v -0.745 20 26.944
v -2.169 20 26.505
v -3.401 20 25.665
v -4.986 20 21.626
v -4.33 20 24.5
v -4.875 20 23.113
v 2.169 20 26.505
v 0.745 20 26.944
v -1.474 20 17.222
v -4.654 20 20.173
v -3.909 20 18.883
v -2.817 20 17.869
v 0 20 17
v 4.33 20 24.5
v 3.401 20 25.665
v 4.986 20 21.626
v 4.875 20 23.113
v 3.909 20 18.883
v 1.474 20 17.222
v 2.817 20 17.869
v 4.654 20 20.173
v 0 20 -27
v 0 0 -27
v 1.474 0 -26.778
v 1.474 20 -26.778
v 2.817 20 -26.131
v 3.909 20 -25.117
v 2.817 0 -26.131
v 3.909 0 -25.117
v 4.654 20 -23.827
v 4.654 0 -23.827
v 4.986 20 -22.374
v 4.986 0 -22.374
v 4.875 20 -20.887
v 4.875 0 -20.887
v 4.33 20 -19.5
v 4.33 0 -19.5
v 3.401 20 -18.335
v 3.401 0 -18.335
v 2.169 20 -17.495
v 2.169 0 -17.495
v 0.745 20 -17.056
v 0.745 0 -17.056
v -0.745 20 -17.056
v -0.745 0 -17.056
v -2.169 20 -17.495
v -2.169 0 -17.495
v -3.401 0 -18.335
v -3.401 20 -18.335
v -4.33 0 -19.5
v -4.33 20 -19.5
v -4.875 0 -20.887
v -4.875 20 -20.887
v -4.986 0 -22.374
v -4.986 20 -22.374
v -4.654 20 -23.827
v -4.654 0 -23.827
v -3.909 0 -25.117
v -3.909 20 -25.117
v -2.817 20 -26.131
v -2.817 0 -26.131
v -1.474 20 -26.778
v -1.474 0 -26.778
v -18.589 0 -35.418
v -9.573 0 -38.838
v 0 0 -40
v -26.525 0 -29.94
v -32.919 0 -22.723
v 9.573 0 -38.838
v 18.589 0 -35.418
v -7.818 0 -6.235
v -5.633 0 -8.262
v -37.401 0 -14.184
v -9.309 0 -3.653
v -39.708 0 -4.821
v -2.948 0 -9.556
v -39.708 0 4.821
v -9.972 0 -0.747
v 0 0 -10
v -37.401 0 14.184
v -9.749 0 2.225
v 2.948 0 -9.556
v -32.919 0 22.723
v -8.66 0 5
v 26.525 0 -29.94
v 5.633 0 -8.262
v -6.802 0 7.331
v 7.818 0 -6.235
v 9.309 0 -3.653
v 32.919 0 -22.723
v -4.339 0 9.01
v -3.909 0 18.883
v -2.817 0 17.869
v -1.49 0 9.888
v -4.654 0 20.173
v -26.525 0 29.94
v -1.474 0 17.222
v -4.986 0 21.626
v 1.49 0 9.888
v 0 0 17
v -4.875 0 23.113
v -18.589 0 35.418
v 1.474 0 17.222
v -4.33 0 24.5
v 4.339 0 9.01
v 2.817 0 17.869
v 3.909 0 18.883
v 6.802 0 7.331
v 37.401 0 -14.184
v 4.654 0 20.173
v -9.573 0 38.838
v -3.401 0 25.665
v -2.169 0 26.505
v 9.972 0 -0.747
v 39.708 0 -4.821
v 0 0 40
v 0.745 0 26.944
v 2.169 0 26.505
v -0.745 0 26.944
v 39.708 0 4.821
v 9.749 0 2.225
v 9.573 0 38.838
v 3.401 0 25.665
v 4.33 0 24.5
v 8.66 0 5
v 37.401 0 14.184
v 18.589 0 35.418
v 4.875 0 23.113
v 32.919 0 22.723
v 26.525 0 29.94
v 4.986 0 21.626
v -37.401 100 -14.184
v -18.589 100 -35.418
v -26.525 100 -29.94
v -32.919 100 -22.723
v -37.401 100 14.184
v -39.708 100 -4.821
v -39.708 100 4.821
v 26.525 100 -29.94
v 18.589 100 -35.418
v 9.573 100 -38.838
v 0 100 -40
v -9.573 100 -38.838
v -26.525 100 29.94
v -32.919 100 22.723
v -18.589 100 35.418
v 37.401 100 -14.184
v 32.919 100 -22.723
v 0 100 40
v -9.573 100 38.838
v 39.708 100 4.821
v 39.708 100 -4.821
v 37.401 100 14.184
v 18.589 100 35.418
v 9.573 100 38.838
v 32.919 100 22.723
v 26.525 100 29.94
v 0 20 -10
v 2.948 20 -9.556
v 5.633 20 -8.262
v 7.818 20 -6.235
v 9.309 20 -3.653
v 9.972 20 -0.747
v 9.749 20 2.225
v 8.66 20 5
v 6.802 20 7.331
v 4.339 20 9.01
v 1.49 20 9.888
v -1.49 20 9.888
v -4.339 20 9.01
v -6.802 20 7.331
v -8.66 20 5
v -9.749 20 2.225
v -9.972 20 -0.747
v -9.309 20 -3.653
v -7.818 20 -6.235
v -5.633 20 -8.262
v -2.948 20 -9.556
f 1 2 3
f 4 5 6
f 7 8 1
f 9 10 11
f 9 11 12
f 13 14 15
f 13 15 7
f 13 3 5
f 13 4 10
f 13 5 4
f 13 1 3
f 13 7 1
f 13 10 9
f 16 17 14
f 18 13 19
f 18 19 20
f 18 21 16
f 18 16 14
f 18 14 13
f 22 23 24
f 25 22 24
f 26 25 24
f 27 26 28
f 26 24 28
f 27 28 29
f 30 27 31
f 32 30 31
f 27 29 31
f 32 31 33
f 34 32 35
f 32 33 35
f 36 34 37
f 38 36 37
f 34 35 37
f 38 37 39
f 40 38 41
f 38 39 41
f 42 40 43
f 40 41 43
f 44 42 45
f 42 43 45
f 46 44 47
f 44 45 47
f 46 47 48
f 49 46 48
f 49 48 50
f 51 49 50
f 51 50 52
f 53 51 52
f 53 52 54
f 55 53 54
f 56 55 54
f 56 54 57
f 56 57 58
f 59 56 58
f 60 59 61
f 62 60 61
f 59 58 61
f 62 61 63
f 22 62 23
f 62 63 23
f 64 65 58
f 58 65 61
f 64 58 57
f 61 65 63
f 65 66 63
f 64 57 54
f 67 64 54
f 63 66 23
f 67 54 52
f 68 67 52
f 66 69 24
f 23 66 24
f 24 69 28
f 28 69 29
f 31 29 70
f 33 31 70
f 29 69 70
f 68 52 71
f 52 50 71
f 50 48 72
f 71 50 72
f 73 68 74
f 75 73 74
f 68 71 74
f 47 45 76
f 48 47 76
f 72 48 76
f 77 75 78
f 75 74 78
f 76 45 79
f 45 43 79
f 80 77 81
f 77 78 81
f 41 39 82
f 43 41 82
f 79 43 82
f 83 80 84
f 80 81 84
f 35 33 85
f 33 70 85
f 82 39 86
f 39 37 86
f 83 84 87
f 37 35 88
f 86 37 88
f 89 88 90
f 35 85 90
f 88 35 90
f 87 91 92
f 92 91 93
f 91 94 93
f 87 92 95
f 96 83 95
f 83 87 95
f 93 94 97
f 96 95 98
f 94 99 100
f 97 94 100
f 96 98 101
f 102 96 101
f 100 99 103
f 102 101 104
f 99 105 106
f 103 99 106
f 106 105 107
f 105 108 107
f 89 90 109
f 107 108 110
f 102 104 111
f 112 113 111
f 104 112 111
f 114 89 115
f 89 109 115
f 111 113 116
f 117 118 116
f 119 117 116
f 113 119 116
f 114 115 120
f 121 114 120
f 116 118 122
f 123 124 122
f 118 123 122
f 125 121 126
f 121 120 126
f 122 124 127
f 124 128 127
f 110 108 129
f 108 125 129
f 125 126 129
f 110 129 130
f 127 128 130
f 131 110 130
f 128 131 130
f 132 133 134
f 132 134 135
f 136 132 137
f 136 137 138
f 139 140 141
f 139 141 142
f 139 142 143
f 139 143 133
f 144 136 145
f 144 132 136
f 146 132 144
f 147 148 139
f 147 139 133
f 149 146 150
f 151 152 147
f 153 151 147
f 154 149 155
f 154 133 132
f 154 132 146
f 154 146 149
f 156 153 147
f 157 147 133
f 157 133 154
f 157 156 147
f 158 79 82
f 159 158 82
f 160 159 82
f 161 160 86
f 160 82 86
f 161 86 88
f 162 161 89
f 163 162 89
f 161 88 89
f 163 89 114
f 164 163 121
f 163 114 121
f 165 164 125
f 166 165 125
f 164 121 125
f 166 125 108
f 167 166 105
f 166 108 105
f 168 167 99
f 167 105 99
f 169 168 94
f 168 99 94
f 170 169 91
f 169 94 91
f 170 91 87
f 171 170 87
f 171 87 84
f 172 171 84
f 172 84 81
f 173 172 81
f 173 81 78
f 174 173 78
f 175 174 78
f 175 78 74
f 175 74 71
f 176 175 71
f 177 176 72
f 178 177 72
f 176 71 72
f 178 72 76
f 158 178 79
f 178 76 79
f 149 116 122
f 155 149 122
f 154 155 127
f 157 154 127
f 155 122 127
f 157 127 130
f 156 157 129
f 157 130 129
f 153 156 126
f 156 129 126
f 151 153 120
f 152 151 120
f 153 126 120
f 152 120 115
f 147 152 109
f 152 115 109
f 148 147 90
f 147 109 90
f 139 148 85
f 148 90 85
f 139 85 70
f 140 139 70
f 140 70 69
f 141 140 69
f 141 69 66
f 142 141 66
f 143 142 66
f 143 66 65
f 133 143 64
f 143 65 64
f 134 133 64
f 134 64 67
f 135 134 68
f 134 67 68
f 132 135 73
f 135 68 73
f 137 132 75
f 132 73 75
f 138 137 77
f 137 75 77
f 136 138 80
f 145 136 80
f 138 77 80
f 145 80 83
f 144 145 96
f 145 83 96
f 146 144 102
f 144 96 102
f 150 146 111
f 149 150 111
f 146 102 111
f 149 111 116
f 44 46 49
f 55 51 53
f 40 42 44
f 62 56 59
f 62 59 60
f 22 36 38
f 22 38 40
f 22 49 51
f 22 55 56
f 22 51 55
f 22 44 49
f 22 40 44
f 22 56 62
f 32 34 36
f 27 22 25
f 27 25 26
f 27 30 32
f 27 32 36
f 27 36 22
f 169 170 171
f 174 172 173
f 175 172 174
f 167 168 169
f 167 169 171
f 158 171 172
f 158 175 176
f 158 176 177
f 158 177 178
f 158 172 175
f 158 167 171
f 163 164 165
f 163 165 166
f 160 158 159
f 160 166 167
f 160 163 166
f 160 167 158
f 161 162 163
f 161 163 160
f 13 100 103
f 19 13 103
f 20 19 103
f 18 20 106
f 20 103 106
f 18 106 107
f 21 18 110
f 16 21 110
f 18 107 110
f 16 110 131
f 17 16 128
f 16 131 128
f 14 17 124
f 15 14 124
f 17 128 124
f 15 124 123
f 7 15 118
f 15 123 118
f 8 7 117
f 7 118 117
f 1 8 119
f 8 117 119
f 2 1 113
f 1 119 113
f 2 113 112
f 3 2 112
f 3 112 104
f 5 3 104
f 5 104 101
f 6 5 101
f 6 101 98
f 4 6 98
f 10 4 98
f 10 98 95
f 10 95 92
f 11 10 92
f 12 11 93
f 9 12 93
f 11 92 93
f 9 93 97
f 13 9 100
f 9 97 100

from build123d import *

# Parameters (mm, degrees)
SKETCH1_R           = 40
BOSS_EXTRUDE1_DEPTH = 100
SKETCH2_R           = 10
SKETCH2_R_2         = 5
CUT_EXTRUDE1_DEPTH  = 20


with BuildPart() as part:
    # Sketch1 → Boss-Extrude1 (new body)
    with BuildSketch(Plane(origin=(0, 0, 0), x_dir=(1, 0, 0), z_dir=(0, 1, 0))):
        with Locations(Location((0, 0, 0), (0, 0, 270))):
            Circle(SKETCH1_R)
    extrude(amount=BOSS_EXTRUDE1_DEPTH)

    # Sketch2 → Cut-Extrude1 (cut)
    with BuildSketch(Plane.XZ):
        with Locations(Location((0, 0, 0), (0, 0, 270))):
            Circle(SKETCH2_R)
        with Locations(Location((0, 22, 0), (0, 0, 270))):
            Circle(SKETCH2_R_2)
        with Locations(Location((0, -22, 0), (0, 0, 270))):
            Circle(SKETCH2_R_2)
    extrude(amount=-CUT_EXTRUDE1_DEPTH, mode=Mode.SUBTRACT)


solid = part.part
